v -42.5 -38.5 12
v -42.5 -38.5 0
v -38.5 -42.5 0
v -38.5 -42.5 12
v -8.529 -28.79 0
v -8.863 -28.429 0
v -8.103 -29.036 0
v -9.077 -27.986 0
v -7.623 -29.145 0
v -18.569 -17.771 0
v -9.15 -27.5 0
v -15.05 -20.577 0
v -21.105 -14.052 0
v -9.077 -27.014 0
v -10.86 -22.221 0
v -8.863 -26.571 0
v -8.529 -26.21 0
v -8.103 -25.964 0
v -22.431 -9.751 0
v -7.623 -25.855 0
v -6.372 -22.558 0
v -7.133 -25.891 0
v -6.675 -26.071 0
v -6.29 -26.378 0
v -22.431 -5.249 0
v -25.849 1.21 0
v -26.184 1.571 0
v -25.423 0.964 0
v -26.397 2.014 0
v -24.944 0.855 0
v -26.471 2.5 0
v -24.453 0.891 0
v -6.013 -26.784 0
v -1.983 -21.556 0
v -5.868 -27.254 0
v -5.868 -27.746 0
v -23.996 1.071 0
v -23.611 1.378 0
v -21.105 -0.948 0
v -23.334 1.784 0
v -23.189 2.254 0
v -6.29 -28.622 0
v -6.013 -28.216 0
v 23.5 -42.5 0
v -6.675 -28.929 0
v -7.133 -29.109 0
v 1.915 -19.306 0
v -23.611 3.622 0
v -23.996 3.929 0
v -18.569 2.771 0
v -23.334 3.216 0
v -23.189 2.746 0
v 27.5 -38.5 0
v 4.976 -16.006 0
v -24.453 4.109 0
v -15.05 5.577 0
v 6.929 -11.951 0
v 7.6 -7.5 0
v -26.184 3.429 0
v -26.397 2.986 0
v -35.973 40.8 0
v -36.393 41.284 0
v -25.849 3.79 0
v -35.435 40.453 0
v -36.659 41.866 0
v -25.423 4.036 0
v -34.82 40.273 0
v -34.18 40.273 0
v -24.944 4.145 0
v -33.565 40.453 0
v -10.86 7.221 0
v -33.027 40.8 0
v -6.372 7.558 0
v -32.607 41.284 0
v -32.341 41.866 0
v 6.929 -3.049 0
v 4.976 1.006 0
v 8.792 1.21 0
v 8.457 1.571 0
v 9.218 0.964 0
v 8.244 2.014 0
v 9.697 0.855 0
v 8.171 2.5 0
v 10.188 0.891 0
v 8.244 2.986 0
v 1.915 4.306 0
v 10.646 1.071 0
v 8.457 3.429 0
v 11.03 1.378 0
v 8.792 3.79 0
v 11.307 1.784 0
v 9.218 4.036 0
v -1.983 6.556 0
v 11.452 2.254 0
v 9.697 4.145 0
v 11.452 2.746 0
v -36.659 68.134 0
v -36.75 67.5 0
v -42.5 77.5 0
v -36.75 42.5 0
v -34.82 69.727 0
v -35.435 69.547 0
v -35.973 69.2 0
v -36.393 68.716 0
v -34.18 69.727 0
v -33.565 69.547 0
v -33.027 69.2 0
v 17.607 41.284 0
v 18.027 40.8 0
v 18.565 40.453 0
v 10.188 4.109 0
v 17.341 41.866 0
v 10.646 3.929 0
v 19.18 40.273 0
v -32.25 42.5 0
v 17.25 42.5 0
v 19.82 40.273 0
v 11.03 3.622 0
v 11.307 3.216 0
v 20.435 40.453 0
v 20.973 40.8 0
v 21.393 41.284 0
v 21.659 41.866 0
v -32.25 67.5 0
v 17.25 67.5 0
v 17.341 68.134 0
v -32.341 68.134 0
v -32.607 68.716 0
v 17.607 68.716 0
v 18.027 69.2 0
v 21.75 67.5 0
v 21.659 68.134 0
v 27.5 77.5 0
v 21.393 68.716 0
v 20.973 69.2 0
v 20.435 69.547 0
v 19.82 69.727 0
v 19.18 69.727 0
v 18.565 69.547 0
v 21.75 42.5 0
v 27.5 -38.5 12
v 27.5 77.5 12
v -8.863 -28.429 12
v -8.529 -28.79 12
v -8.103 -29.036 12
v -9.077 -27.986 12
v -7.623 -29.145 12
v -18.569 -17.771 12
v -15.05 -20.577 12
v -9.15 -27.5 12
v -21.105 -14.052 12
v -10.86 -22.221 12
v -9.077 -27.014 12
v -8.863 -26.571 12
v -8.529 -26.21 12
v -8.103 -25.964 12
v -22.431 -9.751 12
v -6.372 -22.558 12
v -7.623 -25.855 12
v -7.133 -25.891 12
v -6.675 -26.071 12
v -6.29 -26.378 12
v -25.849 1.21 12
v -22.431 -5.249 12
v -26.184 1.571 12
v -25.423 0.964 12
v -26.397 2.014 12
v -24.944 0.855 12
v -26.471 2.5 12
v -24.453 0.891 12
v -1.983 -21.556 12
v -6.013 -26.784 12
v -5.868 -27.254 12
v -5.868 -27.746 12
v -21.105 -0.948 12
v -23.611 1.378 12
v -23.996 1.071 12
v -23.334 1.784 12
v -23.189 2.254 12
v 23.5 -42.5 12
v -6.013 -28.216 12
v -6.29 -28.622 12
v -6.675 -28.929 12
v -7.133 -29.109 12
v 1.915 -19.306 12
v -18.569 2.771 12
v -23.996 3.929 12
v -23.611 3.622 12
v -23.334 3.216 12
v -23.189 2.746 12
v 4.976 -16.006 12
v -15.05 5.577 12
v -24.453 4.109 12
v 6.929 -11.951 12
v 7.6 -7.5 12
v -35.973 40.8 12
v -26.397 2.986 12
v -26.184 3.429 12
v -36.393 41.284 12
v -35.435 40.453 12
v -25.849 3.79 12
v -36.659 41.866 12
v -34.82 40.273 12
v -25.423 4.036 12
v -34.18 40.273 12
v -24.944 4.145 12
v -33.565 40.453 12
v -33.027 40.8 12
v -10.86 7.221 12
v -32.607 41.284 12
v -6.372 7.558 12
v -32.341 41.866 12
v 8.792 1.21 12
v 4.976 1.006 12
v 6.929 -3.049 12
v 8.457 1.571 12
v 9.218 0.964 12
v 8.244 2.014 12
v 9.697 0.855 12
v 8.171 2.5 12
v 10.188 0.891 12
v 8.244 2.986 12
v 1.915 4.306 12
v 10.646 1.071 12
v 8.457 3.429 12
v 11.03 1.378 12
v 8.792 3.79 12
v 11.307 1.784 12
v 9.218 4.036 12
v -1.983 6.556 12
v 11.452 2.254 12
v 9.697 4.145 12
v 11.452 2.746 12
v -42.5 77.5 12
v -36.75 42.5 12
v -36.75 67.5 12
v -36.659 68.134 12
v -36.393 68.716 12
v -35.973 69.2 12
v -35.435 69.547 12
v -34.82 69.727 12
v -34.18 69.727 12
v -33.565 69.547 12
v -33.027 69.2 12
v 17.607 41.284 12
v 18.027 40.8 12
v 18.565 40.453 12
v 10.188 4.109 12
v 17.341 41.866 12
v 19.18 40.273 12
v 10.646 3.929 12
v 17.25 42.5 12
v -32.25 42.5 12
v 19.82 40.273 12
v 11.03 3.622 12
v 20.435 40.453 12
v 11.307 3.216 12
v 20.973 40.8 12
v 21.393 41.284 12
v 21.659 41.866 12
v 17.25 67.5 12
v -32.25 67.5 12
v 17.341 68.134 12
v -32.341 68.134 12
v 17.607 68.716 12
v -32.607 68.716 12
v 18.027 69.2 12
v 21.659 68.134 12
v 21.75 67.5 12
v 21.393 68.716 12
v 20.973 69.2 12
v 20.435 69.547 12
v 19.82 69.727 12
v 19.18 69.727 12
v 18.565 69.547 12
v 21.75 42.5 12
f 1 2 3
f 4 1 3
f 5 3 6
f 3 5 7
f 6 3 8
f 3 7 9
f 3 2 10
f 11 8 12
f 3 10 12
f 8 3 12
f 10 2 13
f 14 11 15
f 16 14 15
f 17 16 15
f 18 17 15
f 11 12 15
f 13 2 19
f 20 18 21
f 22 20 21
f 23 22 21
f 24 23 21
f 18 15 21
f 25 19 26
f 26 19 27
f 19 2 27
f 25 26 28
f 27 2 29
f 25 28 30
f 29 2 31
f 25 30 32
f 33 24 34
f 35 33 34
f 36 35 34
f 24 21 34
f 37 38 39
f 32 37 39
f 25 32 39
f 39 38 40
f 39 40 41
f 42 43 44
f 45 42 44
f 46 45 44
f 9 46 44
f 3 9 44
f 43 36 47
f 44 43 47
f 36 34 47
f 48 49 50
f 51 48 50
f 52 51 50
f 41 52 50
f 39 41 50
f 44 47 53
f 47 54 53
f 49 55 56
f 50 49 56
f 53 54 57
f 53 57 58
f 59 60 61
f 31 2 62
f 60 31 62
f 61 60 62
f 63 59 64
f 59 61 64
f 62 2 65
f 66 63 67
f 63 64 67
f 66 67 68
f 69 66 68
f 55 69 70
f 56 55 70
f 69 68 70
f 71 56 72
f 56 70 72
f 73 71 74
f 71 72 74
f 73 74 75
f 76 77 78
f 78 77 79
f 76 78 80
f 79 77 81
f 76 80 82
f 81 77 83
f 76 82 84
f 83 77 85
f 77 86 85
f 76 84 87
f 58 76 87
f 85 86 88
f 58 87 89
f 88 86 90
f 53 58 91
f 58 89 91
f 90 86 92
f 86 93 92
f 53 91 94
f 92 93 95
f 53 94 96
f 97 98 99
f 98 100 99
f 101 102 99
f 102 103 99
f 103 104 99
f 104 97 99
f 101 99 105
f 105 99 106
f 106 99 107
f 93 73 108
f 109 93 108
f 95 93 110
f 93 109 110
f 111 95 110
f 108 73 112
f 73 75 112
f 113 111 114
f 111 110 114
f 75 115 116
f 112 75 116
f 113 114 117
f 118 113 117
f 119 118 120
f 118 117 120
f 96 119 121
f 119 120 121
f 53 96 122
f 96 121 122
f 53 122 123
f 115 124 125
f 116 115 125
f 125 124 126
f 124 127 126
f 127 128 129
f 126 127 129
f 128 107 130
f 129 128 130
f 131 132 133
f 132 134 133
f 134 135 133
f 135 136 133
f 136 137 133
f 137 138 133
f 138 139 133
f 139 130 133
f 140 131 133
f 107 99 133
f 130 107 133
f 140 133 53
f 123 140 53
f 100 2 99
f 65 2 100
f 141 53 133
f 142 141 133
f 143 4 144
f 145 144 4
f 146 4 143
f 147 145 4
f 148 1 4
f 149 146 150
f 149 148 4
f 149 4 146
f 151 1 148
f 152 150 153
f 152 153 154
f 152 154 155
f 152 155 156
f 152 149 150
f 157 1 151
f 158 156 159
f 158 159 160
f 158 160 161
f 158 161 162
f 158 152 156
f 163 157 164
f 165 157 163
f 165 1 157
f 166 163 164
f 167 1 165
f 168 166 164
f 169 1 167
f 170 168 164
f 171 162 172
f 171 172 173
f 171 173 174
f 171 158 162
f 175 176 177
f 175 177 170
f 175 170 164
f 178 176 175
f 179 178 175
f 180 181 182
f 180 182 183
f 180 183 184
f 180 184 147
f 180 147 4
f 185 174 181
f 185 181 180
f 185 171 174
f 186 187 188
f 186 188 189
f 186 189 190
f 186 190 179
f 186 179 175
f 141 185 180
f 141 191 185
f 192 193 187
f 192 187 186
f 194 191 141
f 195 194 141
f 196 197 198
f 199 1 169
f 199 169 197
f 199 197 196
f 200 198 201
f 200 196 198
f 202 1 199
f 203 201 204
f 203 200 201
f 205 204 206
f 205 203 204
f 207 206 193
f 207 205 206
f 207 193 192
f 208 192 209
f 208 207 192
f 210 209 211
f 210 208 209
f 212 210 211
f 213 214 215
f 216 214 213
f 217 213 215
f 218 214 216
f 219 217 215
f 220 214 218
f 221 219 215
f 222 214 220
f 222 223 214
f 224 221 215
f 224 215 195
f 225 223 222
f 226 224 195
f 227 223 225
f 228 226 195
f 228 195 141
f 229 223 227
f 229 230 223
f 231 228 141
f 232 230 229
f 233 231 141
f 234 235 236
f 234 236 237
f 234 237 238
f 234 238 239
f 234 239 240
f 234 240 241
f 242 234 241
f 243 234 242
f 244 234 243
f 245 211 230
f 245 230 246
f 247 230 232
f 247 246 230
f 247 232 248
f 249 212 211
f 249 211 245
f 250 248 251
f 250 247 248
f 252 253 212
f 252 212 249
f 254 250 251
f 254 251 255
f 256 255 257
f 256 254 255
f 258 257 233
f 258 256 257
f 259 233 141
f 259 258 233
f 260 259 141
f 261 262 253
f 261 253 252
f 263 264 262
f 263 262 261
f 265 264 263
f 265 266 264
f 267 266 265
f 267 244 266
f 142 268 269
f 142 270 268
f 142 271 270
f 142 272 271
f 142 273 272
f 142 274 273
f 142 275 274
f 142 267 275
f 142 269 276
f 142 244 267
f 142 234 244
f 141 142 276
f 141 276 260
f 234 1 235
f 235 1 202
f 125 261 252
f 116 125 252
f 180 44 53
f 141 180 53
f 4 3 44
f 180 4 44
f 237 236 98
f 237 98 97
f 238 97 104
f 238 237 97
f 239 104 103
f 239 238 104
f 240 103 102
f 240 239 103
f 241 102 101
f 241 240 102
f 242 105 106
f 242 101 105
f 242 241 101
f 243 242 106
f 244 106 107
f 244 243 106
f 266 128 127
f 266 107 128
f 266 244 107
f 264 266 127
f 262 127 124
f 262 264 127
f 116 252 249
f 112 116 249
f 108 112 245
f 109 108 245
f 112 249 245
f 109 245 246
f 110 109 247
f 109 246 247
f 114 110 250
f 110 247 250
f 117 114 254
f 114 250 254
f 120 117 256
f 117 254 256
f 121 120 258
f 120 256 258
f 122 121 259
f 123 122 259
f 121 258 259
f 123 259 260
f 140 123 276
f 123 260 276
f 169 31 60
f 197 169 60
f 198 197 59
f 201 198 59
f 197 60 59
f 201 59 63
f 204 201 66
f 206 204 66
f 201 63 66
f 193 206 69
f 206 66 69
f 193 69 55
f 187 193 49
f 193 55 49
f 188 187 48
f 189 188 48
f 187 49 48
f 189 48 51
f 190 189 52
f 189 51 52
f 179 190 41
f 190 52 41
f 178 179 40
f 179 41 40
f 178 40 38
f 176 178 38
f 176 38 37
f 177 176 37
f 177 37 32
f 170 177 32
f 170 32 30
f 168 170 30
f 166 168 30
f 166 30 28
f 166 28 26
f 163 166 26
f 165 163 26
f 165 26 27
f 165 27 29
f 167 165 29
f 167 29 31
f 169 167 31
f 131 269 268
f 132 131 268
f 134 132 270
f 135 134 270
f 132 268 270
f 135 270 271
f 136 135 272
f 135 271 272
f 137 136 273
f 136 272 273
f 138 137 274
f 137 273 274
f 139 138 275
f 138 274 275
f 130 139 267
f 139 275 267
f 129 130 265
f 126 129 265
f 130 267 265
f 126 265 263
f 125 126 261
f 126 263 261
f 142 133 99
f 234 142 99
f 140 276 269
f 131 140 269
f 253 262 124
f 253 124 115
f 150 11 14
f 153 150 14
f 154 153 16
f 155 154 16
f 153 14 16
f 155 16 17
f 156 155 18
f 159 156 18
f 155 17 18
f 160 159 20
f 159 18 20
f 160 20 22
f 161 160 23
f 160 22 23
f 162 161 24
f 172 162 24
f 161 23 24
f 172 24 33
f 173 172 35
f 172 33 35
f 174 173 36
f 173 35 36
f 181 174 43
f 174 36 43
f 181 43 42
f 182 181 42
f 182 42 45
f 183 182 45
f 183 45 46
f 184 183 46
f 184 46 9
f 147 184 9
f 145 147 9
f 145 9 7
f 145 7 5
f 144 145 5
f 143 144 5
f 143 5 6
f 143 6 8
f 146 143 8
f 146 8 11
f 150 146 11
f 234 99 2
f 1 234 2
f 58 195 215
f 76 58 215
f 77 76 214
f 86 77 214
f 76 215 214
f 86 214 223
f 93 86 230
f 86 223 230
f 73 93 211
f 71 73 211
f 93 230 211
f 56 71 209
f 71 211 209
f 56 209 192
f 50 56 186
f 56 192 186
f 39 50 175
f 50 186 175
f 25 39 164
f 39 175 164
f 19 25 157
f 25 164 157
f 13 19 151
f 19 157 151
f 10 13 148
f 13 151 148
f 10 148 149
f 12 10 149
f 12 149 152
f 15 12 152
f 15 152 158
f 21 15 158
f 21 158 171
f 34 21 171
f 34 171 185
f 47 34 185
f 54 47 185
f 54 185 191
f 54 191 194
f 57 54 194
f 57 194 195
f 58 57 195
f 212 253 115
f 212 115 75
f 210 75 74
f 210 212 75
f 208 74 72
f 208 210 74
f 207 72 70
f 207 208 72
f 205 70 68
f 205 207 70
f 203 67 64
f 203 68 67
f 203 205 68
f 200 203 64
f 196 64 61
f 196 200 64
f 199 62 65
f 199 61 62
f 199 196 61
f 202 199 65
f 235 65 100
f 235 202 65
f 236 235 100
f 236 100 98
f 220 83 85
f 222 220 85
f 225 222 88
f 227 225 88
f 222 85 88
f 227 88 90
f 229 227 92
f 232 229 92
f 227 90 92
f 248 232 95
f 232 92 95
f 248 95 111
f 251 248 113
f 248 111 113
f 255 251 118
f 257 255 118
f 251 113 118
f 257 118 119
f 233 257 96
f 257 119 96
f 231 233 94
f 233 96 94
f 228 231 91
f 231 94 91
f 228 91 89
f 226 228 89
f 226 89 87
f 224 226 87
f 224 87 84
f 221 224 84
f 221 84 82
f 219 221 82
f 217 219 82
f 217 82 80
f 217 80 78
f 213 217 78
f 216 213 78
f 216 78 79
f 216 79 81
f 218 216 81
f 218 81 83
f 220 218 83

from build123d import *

# Parameters (mm, degrees)
EXTRUDE_1_DEPTH     = 12
SKETCH_2_R          = 15.1
CUT_EXTRUDE_1_DEPTH = 90.199215243
M4X0_7_1_D          = 3.3
CUT_EXTRUDE_2_DEPTH = 90.199215243


with BuildPart() as part:
    # 草图1 → 凸台-拉伸1 (new body)
    with BuildSketch(Plane.XY):
        Polygon((-38.5, -42.5), (23.5, -42.5), (27.5, -38.5), (27.5, 77.5), (-42.5, 77.5), (-42.5, -38.5), align=None)
    extrude(amount=EXTRUDE_1_DEPTH)

    # 草图2 → 切除-拉伸1 (cut, through all)
    with BuildSketch(Plane.XY.offset(12)):
        with Locations((-7.5, -7.5)):
            Circle(SKETCH_2_R)
    extrude(amount=-CUT_EXTRUDE_1_DEPTH, mode=Mode.SUBTRACT)

    # M4x0.7 螺纹孔1 (through all)
    with Locations(Plane.XY.offset(12)):
        with Locations((-7.5, -27.5), (-24.820508076, 2.5), (9.820508076, 2.5)):
            Hole(M4X0_7_1_D / 2)

    # 草图7 → 切除-拉伸2 (cut, through all)
    with BuildSketch(Plane.XY.offset(12)):
        with BuildLine():
            Line((-32.25, 67.5), (-32.25, 42.5))
            ThreePointArc((-32.25, 42.5), (-34.5, 40.25), (-36.75, 42.5))
            Line((-36.75, 42.5), (-36.75, 67.5))
            ThreePointArc((-36.75, 67.5), (-34.5, 69.75), (-32.25, 67.5))
        make_face()
        with BuildLine():
            Line((17.25, 67.5), (17.25, 42.5))
            ThreePointArc((17.25, 42.5), (19.5, 40.25), (21.75, 42.5))
            Line((21.75, 42.5), (21.75, 67.5))
            ThreePointArc((21.75, 67.5), (19.5, 69.75), (17.25, 67.5))
        make_face()
    extrude(amount=-CUT_EXTRUDE_2_DEPTH, mode=Mode.SUBTRACT)


solid = part.part
